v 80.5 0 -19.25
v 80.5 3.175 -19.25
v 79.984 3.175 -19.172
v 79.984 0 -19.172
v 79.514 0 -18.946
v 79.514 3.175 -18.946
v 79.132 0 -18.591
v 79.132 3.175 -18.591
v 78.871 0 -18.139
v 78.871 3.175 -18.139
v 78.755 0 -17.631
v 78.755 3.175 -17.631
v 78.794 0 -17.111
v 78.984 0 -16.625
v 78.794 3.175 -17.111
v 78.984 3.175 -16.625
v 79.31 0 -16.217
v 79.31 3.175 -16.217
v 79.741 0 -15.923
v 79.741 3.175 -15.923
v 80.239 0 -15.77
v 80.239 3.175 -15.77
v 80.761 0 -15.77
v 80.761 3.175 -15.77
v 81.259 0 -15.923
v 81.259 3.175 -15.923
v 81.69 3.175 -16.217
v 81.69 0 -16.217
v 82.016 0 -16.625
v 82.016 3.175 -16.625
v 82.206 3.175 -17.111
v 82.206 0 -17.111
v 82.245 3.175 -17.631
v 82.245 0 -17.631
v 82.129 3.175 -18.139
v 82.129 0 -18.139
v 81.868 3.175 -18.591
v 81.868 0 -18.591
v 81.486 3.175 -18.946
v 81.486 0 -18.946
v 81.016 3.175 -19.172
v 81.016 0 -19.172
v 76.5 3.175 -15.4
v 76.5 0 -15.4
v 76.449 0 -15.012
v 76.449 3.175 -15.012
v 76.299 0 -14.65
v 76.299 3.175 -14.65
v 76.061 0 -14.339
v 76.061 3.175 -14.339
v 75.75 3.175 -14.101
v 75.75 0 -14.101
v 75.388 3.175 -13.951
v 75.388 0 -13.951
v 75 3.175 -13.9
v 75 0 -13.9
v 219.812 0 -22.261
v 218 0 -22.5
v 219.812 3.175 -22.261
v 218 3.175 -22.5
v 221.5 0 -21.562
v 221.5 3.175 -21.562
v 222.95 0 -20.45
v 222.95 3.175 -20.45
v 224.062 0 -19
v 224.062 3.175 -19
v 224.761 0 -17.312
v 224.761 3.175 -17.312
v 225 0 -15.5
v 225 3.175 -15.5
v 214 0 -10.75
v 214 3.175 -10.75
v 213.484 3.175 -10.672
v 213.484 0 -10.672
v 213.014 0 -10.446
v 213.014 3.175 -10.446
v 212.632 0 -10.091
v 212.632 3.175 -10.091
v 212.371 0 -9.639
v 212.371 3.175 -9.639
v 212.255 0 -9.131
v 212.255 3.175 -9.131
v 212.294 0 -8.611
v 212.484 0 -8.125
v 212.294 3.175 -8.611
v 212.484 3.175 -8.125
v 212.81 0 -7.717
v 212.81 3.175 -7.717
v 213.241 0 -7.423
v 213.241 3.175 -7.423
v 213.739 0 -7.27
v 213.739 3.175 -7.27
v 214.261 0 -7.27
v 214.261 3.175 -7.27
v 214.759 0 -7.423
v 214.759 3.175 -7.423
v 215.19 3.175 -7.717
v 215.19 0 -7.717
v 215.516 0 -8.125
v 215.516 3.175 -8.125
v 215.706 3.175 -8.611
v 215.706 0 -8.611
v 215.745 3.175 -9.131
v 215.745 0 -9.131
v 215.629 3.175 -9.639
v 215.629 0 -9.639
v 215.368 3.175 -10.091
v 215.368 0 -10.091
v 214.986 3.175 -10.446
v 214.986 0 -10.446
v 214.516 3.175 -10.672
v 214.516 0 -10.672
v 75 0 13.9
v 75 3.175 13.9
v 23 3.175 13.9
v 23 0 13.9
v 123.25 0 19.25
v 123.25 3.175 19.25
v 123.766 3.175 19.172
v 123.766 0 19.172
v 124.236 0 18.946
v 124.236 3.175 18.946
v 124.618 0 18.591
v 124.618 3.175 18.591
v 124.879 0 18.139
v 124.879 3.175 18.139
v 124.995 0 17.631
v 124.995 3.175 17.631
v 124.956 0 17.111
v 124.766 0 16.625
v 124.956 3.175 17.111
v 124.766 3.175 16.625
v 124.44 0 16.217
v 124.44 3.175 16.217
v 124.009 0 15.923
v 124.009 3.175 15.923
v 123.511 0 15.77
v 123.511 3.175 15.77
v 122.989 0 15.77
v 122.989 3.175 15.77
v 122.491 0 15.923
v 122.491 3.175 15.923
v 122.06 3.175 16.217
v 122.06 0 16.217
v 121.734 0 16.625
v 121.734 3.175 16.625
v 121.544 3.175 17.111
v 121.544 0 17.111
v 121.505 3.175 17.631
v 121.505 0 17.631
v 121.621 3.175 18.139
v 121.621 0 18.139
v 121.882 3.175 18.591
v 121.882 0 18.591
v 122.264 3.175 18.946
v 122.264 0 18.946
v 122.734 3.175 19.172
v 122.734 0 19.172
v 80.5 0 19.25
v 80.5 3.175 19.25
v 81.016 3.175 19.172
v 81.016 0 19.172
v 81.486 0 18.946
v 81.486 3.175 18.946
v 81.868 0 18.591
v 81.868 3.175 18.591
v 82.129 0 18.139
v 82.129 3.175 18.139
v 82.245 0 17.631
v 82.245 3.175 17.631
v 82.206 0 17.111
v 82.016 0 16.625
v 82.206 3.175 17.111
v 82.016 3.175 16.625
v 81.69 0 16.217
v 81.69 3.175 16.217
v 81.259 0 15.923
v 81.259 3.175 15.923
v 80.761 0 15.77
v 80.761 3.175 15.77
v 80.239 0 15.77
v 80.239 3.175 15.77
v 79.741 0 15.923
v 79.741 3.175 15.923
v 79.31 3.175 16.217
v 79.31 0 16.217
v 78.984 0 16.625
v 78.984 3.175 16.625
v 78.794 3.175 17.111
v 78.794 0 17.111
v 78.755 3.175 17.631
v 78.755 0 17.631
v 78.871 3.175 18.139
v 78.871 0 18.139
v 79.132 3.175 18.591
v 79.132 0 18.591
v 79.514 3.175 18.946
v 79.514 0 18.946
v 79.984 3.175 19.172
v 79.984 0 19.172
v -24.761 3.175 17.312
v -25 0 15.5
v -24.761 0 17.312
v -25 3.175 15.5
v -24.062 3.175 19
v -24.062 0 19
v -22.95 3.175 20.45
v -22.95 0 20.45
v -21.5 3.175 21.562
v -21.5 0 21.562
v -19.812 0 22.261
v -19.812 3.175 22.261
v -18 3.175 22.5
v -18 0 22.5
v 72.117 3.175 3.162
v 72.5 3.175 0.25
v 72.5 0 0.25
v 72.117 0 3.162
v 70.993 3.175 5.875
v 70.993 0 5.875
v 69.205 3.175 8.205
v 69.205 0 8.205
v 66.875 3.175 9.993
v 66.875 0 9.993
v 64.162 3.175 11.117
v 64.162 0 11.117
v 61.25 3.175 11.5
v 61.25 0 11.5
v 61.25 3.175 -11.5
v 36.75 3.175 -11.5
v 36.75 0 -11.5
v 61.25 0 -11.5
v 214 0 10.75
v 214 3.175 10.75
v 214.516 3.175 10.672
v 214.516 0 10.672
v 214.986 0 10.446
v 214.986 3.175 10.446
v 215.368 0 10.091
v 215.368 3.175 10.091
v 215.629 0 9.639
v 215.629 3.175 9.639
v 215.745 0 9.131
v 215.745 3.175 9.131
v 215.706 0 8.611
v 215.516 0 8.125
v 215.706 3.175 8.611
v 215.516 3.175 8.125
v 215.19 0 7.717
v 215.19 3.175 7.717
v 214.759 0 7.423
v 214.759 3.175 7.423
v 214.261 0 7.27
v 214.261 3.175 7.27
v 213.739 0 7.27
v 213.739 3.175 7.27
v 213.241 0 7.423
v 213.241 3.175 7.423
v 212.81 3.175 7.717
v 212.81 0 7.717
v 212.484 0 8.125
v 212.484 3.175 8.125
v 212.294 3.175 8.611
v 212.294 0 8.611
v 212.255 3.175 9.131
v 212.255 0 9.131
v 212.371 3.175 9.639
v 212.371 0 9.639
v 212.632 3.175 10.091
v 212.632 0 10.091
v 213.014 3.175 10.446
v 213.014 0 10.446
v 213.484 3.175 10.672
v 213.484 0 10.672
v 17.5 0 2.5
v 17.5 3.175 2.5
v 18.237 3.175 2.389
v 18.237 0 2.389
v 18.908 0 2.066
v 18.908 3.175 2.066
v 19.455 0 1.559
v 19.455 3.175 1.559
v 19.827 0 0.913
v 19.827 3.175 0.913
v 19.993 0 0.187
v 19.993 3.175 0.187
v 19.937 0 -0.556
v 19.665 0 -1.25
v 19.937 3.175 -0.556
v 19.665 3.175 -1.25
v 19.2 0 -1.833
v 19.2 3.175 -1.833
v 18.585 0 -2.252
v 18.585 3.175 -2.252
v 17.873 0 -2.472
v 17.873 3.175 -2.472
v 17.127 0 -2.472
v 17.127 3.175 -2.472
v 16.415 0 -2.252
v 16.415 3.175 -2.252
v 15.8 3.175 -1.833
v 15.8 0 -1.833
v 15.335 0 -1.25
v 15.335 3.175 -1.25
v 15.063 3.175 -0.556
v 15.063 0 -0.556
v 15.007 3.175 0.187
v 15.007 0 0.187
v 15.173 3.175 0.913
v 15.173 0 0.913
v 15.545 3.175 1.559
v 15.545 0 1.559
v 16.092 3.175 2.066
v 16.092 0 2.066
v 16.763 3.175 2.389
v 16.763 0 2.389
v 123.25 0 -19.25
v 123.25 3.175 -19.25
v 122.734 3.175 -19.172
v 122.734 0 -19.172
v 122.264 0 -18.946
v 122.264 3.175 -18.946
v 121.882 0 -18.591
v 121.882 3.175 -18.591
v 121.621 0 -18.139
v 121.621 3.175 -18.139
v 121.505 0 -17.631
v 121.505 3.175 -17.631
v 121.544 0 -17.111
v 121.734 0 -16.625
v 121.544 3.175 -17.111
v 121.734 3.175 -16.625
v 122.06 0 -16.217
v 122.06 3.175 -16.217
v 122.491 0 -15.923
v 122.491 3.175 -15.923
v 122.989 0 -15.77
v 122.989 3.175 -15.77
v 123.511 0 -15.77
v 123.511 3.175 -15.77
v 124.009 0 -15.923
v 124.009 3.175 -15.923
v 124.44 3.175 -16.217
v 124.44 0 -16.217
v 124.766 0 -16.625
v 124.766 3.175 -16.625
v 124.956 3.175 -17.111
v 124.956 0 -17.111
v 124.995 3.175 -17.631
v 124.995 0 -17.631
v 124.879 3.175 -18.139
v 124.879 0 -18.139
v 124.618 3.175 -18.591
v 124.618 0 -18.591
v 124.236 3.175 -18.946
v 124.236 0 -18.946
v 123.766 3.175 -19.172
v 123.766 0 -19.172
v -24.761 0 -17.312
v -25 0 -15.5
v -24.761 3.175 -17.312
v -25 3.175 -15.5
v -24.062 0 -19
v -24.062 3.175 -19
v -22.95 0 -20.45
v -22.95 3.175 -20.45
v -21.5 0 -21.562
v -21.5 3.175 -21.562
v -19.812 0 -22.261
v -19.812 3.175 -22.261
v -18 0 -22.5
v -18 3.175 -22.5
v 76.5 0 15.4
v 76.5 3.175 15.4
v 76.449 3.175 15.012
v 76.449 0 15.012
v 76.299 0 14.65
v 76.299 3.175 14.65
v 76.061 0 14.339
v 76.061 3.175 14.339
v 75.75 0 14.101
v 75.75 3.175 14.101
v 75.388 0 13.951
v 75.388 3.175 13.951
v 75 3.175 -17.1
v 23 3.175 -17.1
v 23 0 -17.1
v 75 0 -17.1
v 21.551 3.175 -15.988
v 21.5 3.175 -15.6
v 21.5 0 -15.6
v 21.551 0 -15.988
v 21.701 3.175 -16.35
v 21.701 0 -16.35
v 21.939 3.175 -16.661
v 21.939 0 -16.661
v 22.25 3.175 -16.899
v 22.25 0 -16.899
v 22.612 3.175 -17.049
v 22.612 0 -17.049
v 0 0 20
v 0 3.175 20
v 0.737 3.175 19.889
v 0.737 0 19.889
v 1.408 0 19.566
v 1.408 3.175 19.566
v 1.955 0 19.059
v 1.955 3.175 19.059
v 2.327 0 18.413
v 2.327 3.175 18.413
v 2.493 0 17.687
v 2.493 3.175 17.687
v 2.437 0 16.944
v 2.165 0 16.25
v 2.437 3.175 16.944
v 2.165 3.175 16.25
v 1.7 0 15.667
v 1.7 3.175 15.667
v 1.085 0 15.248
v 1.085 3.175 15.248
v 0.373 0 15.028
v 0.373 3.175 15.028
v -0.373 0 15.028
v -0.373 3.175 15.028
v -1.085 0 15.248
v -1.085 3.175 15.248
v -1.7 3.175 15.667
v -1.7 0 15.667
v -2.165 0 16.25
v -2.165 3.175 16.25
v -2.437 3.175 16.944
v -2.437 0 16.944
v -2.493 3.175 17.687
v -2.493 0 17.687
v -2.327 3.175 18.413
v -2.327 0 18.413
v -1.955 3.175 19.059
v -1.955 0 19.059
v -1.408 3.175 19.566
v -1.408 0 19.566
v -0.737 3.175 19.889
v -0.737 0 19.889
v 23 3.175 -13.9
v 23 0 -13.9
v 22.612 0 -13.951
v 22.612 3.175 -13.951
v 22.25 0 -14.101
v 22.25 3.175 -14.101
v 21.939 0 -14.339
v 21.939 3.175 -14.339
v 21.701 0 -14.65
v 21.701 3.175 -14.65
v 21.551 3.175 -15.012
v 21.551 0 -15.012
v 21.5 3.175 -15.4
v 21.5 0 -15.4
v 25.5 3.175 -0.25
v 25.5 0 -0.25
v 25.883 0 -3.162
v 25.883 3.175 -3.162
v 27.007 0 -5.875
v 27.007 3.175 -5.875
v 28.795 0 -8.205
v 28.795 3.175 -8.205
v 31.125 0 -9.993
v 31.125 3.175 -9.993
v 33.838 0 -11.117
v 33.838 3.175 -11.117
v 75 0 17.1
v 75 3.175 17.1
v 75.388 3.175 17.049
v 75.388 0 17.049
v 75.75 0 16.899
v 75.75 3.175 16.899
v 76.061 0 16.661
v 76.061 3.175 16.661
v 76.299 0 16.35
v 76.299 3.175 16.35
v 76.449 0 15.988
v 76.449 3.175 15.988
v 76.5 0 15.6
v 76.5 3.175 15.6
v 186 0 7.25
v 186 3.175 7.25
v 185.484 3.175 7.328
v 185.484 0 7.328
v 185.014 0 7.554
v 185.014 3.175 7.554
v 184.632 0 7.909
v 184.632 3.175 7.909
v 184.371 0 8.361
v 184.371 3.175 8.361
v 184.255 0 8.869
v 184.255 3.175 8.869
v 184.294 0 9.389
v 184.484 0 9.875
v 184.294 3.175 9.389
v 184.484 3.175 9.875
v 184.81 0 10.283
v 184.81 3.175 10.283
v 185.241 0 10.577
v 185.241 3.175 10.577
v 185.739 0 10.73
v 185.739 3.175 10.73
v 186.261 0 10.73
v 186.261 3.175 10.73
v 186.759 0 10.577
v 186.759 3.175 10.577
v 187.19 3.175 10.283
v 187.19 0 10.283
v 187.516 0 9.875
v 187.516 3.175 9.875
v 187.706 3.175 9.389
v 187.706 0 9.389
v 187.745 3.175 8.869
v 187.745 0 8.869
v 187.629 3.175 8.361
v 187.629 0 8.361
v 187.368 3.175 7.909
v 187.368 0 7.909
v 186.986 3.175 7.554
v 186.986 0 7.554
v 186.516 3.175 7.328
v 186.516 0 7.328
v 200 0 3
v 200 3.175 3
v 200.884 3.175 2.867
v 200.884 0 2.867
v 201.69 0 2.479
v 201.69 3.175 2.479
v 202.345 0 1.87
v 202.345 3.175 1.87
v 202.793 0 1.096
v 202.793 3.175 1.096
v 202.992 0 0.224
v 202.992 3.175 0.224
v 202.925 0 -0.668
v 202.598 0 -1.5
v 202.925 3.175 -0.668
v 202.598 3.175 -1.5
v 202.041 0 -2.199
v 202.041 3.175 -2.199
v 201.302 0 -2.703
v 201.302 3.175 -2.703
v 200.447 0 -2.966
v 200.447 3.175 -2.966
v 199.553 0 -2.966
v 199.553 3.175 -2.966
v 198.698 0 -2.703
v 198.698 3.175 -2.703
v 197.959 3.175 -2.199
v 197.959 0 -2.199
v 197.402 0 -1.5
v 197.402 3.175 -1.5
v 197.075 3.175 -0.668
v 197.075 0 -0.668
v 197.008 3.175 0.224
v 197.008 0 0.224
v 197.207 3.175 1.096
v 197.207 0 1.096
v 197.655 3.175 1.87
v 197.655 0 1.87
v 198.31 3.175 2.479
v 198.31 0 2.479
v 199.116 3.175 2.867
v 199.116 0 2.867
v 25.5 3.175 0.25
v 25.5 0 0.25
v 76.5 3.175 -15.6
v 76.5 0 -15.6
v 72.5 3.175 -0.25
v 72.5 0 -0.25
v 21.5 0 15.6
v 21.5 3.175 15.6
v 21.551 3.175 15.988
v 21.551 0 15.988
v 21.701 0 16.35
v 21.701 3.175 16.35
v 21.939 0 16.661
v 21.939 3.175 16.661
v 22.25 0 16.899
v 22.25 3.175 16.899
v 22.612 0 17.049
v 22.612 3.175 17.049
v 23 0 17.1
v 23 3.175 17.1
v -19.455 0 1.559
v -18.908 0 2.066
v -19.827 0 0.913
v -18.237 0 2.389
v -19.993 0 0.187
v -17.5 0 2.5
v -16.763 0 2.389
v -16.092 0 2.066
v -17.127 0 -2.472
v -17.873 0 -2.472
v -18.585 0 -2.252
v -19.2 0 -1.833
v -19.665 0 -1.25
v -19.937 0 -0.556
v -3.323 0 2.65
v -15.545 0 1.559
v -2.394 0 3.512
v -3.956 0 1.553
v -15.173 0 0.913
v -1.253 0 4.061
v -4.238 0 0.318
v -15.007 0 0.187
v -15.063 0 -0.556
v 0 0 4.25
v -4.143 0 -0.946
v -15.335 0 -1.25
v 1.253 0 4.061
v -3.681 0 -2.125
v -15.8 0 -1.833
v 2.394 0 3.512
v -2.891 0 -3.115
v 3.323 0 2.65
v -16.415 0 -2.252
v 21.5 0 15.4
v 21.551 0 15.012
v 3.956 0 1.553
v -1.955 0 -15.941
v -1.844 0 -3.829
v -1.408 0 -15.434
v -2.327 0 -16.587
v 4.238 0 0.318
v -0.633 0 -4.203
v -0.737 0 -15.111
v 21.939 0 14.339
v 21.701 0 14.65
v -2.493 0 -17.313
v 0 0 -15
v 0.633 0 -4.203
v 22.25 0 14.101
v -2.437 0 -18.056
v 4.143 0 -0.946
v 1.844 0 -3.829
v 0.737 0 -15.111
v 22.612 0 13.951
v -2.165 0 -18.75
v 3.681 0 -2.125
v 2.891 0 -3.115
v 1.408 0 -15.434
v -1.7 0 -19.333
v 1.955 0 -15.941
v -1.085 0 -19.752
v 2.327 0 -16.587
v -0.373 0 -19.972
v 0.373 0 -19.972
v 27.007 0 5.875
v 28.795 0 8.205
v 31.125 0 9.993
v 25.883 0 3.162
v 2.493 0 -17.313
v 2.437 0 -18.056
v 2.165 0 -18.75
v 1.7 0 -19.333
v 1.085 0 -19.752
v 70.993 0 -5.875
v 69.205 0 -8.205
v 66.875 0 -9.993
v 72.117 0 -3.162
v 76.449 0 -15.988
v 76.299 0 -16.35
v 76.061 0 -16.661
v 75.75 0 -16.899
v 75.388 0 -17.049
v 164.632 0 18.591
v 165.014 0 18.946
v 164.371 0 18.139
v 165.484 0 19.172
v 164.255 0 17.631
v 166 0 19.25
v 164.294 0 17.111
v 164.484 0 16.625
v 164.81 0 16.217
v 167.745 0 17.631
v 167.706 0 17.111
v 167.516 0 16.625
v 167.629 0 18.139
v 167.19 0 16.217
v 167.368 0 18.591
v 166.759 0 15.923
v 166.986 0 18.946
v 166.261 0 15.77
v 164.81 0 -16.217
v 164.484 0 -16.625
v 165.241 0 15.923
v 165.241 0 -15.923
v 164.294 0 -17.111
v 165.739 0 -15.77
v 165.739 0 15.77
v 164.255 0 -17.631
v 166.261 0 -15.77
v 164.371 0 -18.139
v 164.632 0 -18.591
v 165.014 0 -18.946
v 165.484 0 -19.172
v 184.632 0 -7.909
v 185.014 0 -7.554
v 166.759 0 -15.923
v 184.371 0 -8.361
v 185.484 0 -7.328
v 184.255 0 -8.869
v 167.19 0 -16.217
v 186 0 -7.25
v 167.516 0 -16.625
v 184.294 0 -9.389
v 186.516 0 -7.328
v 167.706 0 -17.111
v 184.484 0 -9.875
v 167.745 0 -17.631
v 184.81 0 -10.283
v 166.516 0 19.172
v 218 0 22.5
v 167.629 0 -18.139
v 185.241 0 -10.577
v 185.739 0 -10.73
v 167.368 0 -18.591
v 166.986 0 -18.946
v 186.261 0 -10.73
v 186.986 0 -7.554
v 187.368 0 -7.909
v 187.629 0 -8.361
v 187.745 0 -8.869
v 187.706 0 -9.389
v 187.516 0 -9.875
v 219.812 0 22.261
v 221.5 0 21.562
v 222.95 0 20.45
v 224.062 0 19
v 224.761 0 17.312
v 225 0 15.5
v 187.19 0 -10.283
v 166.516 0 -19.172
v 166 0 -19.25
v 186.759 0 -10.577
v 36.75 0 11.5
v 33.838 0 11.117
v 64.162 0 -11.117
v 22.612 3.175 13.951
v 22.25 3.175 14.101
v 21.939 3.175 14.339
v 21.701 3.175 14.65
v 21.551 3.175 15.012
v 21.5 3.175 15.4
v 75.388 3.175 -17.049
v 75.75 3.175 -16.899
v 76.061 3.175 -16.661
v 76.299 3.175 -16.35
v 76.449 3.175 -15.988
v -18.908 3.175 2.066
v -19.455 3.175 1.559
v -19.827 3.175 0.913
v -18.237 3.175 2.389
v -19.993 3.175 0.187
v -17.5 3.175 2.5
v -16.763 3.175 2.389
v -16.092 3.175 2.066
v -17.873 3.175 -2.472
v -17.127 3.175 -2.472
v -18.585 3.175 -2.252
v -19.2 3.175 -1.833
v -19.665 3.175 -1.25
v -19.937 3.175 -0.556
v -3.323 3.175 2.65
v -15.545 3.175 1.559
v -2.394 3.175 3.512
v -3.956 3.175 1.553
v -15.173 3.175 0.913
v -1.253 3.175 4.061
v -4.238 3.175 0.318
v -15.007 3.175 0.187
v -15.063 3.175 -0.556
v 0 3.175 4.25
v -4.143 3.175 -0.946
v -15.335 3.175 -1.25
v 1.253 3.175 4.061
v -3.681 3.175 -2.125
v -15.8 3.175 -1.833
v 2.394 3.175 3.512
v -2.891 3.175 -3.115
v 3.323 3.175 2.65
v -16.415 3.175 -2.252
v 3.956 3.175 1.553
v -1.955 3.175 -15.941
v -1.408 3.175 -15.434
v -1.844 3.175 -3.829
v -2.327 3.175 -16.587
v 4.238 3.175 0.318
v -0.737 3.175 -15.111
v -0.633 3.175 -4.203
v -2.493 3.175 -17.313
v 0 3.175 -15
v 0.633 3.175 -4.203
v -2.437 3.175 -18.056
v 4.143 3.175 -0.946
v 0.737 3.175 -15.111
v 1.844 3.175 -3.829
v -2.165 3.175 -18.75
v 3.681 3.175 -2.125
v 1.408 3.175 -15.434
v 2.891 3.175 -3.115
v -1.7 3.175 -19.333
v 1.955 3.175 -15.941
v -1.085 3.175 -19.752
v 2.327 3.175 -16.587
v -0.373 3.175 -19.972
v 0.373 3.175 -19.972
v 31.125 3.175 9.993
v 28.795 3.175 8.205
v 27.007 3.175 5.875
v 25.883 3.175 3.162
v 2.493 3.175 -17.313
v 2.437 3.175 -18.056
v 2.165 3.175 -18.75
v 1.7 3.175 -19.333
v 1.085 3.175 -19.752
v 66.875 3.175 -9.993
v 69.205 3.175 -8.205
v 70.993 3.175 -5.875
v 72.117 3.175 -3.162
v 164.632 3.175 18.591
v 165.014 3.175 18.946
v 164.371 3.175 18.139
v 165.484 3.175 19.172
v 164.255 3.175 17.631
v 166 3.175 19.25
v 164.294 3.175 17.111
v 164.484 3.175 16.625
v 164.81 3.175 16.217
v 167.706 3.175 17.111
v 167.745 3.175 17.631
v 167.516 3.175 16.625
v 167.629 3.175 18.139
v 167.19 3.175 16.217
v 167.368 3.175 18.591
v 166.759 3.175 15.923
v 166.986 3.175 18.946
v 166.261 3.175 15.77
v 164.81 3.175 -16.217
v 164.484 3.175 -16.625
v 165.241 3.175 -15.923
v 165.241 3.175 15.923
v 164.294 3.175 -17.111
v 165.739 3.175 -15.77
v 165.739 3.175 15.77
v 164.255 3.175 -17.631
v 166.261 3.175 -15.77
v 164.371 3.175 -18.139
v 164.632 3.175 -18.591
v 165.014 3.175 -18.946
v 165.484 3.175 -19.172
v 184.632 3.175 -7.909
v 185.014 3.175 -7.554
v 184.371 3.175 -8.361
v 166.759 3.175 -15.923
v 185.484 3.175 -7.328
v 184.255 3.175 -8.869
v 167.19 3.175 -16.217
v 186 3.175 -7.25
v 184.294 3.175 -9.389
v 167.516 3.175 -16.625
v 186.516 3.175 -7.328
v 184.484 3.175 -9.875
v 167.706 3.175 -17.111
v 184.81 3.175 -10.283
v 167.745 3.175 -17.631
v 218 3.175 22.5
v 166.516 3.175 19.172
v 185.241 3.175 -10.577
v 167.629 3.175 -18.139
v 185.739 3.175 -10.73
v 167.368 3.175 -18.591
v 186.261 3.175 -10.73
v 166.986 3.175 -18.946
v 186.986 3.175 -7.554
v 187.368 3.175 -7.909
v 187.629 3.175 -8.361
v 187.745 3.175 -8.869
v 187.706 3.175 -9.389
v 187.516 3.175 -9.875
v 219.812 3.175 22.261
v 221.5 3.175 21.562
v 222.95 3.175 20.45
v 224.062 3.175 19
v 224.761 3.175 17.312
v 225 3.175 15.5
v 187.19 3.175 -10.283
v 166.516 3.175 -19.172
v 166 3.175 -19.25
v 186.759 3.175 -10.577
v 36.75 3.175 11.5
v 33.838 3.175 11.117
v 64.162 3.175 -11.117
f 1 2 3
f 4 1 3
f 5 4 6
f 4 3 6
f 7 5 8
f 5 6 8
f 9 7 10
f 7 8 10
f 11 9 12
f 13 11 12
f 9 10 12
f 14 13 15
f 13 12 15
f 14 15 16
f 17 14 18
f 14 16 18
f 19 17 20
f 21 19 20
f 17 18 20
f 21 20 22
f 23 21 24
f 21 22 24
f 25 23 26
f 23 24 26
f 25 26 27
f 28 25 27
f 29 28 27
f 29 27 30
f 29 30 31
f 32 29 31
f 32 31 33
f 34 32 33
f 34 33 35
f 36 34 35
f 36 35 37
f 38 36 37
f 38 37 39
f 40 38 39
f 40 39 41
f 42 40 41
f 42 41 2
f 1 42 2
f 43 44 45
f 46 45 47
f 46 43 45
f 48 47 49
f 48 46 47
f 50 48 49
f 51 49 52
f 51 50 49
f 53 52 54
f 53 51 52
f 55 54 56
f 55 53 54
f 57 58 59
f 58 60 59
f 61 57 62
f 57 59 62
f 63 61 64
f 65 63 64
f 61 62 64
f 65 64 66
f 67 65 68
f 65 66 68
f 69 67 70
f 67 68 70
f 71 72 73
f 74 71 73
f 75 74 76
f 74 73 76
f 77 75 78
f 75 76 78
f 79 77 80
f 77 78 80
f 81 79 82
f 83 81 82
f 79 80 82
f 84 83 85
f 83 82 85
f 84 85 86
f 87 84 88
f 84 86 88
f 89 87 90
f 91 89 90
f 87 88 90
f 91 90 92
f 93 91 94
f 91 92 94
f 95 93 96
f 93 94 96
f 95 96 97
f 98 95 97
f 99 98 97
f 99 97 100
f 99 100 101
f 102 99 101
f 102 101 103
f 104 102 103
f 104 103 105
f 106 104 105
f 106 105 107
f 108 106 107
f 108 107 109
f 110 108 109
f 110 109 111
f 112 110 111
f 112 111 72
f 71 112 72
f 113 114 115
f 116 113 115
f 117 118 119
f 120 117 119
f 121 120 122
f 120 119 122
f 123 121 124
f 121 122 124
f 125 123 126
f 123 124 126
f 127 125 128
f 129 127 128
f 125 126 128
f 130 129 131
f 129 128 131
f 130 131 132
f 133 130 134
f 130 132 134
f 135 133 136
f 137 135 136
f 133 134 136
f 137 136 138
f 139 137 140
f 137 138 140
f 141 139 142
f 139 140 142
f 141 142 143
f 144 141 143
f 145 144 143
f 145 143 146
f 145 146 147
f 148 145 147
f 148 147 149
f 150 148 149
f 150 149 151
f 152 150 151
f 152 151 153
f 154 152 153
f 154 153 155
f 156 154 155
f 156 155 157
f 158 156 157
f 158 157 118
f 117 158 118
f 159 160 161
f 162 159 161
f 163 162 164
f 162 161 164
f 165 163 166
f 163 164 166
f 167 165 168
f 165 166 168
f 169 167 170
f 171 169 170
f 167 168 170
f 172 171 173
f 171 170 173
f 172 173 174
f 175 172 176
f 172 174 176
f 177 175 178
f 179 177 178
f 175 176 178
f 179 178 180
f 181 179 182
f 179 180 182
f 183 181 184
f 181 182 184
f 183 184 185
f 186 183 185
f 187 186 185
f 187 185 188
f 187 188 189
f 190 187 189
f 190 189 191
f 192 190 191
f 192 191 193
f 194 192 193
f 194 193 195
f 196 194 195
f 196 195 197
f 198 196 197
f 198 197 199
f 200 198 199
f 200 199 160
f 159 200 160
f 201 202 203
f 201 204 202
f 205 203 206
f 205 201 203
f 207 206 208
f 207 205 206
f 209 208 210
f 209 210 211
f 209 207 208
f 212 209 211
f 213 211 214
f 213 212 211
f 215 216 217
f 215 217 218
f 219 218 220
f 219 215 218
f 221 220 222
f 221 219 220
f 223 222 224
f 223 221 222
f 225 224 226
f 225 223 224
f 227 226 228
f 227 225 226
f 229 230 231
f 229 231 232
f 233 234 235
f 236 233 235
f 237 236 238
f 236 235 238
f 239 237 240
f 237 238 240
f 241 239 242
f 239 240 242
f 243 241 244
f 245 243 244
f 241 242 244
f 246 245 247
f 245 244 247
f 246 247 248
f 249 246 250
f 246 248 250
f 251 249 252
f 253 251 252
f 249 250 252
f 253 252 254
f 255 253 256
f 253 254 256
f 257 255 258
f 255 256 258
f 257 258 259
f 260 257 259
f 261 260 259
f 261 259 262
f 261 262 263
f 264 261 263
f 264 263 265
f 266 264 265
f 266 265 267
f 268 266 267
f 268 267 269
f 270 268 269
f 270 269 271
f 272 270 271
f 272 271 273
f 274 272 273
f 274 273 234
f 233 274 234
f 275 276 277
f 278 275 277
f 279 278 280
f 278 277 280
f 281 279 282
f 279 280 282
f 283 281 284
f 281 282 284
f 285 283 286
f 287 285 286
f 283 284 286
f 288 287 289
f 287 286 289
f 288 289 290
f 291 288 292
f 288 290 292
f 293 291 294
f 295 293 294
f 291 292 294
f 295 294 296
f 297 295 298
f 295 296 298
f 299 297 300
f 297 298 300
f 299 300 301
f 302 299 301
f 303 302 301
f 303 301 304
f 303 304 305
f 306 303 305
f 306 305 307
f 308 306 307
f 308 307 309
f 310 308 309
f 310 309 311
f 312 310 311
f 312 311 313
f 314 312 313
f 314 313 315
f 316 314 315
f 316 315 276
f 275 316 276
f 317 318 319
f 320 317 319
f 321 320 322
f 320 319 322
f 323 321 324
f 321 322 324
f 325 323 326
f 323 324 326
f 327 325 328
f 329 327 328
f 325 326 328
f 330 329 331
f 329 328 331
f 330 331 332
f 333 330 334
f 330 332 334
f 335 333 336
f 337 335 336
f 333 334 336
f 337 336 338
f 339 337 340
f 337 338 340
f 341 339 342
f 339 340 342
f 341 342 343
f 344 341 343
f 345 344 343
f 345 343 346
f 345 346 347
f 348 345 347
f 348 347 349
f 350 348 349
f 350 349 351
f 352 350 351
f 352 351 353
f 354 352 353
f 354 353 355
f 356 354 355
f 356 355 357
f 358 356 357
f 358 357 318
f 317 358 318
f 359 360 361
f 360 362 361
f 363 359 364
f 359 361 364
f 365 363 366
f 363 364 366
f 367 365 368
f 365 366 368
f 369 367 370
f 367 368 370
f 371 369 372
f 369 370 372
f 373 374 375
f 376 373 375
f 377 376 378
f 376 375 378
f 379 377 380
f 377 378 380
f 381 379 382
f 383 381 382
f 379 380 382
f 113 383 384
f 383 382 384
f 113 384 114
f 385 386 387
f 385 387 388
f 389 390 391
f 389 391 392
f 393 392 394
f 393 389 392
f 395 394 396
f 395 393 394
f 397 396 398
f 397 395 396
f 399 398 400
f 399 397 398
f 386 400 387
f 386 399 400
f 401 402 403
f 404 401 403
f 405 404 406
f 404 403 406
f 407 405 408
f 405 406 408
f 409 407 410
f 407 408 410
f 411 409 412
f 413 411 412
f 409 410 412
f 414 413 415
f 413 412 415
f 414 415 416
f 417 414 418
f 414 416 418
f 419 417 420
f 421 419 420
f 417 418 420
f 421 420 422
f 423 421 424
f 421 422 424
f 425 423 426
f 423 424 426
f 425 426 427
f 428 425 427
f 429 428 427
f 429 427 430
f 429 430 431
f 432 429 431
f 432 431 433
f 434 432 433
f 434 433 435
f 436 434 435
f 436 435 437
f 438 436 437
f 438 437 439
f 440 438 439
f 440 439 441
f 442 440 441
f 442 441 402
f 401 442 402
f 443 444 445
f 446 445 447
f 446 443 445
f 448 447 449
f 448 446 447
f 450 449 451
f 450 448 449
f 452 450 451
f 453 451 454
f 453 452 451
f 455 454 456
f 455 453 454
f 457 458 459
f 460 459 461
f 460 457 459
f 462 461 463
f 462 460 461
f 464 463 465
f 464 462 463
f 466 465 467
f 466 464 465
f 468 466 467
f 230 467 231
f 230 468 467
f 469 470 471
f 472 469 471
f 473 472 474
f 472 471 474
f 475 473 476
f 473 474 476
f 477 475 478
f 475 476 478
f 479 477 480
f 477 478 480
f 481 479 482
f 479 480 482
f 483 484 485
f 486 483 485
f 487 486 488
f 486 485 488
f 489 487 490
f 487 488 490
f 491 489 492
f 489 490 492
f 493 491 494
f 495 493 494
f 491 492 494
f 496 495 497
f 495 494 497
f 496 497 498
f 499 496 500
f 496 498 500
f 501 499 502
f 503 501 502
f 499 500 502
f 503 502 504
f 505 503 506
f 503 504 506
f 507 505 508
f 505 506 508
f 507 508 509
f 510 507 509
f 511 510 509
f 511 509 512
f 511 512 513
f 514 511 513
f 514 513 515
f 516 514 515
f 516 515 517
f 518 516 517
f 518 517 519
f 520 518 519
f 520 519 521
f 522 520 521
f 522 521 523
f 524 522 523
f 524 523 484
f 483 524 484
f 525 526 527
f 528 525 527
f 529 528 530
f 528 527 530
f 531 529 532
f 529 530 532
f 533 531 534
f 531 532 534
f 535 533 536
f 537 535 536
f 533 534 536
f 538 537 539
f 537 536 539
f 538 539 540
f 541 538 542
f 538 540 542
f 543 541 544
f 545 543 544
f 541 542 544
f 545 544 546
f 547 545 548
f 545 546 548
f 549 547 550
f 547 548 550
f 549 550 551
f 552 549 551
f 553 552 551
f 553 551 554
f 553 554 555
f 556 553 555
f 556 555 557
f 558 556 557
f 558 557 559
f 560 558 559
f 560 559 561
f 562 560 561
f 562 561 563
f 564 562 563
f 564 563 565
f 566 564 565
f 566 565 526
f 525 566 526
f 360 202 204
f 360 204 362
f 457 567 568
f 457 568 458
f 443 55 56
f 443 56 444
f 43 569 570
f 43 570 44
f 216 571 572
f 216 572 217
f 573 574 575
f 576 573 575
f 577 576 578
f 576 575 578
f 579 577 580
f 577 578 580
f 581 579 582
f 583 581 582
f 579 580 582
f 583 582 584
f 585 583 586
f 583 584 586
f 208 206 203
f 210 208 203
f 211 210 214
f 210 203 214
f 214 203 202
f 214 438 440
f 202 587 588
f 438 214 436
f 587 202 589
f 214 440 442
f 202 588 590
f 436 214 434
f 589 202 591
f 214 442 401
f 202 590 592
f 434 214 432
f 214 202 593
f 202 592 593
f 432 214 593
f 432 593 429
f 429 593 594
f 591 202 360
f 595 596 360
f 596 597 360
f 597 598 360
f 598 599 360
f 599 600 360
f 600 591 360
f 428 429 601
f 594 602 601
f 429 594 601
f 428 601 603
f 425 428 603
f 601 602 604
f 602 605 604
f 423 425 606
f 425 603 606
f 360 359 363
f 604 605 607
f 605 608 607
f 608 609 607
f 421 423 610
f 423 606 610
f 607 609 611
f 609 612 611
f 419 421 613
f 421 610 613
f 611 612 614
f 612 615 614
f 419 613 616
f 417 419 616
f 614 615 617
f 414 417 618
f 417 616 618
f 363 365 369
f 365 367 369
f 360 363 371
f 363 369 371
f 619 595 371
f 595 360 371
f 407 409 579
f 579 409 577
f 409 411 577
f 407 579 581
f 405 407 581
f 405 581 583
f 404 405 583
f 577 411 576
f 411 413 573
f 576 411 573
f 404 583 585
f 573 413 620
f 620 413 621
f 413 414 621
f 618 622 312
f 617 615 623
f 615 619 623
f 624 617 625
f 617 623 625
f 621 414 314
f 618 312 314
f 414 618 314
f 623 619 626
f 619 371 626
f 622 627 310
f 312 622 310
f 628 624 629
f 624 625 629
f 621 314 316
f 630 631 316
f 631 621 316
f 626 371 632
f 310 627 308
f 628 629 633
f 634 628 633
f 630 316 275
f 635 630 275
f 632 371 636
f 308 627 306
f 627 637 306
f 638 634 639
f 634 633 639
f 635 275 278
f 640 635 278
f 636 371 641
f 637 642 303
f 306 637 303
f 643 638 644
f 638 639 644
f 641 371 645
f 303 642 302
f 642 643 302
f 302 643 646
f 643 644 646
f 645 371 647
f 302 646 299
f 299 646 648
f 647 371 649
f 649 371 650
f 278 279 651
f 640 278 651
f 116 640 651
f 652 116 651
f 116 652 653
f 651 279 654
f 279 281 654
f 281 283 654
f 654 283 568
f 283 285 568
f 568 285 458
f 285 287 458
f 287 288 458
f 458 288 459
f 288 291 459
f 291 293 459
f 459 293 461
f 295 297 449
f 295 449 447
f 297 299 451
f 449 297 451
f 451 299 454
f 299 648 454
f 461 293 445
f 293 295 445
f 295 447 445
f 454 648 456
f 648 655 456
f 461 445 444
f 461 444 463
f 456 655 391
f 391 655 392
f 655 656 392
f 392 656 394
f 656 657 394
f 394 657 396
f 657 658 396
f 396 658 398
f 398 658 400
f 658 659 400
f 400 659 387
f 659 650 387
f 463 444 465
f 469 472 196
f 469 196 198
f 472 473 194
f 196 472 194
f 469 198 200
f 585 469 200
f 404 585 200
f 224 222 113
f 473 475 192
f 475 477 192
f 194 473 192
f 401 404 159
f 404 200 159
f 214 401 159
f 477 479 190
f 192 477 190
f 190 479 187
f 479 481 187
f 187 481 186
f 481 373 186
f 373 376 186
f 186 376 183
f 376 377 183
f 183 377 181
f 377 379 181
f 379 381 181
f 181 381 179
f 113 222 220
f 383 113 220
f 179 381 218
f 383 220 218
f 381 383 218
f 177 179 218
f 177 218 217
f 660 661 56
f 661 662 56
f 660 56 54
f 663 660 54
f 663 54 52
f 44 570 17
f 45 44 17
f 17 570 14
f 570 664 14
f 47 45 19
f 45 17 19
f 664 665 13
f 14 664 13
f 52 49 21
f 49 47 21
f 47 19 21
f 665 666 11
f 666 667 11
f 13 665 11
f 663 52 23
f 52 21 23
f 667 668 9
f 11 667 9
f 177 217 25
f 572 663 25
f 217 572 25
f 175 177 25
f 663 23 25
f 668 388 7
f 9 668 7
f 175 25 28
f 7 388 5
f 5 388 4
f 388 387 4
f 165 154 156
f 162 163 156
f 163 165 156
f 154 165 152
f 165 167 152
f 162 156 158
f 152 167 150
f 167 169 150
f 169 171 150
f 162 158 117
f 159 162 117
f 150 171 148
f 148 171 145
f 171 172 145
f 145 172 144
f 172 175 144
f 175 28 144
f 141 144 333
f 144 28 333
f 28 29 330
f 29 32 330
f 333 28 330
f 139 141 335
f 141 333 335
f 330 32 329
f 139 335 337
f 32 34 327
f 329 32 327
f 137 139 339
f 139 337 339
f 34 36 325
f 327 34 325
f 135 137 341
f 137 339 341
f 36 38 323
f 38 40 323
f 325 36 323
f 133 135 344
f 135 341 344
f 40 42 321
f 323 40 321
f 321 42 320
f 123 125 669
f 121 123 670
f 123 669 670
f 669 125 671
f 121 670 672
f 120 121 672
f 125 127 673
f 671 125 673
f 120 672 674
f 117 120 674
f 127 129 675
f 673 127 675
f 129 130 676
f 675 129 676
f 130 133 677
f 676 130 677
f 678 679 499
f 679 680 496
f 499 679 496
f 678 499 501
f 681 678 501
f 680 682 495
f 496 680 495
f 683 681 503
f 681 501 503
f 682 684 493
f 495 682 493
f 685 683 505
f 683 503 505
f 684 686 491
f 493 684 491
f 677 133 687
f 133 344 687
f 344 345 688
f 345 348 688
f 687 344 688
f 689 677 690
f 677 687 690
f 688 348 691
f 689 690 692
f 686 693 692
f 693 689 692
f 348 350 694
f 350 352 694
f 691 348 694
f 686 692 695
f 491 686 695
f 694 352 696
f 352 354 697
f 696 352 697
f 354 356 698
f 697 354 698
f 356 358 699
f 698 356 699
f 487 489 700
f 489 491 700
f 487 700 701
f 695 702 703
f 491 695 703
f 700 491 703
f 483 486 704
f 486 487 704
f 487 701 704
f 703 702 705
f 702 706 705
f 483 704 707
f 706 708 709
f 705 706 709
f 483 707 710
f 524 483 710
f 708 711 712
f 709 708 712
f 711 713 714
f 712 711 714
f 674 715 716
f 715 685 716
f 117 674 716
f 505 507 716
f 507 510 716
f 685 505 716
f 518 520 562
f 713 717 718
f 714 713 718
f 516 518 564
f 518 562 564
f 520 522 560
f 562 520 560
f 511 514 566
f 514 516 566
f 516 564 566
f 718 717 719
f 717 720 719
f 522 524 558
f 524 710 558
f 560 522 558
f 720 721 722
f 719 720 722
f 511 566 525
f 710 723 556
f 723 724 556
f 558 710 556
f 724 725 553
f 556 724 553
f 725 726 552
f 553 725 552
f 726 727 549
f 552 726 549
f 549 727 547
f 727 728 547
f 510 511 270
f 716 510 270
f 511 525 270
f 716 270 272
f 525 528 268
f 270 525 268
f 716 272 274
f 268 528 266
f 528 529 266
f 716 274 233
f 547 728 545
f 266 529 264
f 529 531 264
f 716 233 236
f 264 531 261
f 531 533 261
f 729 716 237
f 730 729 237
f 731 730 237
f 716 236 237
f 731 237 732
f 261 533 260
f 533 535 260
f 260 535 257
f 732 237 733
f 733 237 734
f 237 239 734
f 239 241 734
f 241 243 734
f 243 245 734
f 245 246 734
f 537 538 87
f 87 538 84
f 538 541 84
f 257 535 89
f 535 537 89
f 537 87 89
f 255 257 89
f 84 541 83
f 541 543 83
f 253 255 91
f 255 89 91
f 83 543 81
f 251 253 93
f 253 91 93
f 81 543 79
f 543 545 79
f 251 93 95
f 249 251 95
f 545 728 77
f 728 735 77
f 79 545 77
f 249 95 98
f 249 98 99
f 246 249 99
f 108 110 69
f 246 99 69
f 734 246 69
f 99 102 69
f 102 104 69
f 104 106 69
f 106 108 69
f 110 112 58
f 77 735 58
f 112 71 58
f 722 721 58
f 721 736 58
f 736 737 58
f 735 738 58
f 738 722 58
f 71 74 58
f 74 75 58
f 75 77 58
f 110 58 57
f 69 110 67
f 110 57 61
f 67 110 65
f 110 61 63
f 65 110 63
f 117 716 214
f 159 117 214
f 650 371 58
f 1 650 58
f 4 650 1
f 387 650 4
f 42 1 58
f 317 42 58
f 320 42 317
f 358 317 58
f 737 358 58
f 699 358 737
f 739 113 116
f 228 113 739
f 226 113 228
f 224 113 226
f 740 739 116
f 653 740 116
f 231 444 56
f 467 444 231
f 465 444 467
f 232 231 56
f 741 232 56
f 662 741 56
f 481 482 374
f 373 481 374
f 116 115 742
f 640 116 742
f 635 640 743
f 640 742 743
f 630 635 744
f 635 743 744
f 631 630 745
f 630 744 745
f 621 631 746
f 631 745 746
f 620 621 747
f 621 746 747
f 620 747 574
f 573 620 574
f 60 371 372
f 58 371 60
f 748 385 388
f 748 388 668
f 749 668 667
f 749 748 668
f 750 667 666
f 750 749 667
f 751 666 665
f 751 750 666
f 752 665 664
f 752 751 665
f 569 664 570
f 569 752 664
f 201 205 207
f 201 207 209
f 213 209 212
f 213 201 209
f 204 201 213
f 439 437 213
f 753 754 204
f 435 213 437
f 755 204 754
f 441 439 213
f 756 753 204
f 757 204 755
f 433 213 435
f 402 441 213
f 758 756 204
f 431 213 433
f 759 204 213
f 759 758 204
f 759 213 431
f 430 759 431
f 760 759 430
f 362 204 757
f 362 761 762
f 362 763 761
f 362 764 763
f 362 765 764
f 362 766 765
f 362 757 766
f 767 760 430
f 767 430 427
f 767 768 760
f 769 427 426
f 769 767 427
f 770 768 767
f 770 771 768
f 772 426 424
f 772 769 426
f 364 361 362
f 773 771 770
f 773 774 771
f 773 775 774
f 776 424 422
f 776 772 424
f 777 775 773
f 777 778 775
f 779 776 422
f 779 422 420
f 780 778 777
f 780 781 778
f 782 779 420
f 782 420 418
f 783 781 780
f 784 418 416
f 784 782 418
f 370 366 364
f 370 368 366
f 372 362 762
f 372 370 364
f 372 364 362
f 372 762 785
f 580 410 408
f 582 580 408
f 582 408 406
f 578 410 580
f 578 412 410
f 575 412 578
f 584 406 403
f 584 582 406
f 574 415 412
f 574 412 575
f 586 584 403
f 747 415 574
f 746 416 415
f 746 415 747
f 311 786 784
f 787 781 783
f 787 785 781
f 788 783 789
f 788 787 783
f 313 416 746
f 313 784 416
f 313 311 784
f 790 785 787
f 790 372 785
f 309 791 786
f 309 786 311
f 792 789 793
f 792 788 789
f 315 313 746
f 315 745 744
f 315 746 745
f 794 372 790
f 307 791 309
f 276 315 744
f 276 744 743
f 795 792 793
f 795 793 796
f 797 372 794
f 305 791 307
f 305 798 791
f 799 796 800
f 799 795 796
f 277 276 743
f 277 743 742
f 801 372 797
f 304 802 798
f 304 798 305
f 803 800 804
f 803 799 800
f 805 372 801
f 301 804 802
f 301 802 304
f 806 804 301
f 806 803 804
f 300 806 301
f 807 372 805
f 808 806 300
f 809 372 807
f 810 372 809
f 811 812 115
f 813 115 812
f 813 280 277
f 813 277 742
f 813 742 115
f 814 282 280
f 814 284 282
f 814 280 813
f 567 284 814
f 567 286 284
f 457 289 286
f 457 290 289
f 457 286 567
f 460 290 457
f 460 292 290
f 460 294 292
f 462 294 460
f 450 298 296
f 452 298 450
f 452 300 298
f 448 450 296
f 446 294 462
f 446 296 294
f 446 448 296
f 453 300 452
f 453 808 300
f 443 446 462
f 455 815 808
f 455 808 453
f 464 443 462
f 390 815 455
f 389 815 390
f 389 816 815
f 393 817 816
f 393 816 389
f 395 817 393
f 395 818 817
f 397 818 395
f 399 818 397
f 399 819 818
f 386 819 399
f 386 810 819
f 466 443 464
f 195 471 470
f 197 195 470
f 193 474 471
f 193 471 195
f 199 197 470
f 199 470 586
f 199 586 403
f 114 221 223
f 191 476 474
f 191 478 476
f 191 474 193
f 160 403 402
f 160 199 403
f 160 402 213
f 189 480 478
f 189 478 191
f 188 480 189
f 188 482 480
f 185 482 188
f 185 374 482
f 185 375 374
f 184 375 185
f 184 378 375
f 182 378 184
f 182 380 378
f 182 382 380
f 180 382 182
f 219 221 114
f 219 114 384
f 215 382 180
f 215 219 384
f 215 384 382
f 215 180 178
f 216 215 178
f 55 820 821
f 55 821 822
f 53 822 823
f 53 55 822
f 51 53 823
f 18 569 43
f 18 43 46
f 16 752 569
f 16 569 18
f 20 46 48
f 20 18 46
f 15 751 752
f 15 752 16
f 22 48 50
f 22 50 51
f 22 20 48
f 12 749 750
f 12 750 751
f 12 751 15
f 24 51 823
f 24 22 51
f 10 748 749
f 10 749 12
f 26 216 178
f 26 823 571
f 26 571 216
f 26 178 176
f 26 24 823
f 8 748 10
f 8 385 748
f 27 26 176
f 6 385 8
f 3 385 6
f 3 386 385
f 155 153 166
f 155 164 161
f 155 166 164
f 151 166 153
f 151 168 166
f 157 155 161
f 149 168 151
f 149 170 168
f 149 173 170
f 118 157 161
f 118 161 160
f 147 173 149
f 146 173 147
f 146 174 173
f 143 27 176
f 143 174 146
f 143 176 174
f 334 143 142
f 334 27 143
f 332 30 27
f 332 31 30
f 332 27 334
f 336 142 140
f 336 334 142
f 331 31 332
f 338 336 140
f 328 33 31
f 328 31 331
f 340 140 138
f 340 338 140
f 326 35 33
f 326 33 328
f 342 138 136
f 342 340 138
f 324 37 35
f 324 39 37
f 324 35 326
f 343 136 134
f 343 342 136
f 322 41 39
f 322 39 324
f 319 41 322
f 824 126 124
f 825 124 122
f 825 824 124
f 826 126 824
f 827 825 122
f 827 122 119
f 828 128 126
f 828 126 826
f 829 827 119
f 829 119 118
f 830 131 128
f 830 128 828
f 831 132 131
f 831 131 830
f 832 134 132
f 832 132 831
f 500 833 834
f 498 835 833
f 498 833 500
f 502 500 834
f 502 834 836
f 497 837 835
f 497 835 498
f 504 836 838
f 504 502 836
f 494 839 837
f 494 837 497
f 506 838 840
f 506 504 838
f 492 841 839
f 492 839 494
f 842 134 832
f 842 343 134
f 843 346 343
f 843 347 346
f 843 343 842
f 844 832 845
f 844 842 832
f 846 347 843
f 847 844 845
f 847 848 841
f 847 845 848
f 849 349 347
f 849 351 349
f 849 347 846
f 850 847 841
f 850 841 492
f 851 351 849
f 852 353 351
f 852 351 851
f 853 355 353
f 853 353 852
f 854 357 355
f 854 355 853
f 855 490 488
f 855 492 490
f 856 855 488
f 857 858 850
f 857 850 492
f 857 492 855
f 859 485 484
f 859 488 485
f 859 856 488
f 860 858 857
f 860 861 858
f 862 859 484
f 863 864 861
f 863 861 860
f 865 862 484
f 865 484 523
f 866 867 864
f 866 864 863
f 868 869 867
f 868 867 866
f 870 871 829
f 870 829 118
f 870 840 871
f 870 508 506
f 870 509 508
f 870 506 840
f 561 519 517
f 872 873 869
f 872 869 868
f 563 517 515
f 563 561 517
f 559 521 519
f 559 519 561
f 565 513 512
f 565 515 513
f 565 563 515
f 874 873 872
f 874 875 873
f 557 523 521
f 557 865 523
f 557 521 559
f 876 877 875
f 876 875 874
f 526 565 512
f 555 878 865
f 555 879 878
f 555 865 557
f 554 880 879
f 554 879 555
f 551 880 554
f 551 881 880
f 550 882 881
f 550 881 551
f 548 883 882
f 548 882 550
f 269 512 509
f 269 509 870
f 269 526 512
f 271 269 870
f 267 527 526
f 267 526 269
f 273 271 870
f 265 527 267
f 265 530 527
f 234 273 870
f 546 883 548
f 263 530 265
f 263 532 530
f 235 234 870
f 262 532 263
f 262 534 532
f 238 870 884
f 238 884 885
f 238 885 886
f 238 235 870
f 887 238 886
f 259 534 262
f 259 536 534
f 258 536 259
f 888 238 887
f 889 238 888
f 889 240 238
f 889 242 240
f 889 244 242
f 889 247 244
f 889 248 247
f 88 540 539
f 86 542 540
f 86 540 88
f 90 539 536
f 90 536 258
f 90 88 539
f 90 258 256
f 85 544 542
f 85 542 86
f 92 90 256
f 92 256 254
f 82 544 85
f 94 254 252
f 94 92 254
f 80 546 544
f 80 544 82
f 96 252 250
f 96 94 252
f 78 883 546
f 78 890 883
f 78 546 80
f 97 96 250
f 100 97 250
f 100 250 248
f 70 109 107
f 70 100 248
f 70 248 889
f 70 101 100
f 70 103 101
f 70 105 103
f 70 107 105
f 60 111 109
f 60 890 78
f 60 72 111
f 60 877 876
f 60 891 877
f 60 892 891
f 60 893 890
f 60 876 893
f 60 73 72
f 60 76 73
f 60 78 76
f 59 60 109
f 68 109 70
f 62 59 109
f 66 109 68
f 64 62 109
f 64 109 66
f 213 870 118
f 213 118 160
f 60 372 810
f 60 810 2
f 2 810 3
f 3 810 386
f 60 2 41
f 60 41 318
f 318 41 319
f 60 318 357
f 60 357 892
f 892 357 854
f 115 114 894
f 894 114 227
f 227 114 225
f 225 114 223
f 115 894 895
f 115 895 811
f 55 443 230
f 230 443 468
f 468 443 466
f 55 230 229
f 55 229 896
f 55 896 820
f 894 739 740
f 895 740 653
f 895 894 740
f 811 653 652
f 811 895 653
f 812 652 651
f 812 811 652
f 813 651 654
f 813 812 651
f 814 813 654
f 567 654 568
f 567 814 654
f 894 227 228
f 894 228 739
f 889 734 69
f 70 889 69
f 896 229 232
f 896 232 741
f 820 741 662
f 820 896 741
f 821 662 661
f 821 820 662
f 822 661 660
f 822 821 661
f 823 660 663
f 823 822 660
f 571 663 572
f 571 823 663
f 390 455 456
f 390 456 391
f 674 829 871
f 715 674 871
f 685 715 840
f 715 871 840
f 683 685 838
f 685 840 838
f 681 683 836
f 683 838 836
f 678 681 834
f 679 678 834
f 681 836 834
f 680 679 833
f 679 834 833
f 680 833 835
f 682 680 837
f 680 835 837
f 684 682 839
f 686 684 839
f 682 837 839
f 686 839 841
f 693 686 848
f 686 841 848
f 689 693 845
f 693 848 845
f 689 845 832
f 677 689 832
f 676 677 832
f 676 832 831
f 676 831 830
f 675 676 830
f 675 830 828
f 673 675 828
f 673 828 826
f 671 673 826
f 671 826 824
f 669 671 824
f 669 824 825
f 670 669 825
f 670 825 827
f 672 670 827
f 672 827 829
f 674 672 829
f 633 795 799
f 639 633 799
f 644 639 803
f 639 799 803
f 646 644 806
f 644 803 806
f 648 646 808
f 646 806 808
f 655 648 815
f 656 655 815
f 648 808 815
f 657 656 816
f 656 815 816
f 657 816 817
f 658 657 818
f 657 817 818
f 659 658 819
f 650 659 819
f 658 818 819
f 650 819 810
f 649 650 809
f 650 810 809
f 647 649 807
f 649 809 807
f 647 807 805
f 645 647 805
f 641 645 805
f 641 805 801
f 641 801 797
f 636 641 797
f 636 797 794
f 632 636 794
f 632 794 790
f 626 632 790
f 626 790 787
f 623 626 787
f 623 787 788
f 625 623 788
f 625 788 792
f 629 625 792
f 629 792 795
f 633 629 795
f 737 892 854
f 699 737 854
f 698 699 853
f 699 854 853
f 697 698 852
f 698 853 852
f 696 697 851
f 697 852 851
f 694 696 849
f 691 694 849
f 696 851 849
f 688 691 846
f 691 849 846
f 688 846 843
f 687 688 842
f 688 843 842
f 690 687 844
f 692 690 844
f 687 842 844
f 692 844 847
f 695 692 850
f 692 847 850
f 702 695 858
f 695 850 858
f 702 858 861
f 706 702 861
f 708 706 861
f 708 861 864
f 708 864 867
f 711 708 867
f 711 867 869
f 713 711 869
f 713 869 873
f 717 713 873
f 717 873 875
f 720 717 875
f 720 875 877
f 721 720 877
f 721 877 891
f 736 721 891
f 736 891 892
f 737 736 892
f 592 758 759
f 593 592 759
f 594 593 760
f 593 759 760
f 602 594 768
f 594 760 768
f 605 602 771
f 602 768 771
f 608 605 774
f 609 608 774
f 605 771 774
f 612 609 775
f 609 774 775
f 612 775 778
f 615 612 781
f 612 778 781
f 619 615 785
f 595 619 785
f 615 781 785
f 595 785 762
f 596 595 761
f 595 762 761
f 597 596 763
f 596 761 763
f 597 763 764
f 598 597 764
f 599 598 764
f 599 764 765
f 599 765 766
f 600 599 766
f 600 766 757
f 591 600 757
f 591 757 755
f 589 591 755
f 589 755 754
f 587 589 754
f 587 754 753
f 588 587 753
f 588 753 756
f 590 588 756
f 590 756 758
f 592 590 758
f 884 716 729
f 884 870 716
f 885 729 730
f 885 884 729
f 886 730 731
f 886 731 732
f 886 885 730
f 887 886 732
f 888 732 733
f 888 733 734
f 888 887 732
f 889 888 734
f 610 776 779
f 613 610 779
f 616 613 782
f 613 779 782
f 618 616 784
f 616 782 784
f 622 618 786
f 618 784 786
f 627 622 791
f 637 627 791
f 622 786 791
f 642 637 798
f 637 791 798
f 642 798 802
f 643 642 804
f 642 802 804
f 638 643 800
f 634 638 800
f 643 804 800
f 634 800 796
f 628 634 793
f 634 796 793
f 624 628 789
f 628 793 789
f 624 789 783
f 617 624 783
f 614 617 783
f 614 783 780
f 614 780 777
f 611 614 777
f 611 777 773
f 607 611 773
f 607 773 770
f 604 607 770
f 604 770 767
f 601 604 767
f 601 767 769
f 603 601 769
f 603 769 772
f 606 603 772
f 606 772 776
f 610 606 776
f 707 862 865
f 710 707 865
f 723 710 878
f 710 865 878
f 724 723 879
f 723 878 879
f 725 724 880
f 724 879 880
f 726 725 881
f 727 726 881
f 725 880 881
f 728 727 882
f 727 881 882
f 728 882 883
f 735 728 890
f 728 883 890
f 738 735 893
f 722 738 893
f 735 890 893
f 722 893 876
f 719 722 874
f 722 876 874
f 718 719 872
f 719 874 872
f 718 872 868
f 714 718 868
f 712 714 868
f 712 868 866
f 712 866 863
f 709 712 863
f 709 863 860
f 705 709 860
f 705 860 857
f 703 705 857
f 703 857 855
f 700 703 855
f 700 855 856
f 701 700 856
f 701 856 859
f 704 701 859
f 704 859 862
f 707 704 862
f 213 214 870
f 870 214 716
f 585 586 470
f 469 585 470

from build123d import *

# Parameters (mm, degrees)
SKETCH1_W           = 250
SKETCH1_H           = 45
BOSS_EXTRUDE1_DEPTH = 3.175
SKETCH4_R           = 3
SKETCH4_R_2         = 1.75
CUT_EXTRUDE1_DEPTH  = 227.144490592
SKETCH5_R           = 4.25
CUT_EXTRUDE2_DEPTH  = 227.144490592
SKETCH6_R           = 11.5
SKETCH6_R_2         = 1.5
CUT_EXTRUDE3_DEPTH  = 227.144490592
SKETCH10_R          = 1.75
CUT_EXTRUDE4_DEPTH  = 227.144490592
FILLET1_R           = 7
SKETCH11_R          = 2.5
CUT_EXTRUDE5_DEPTH  = 227.144490592
CUT_EXTRUDE6_DEPTH  = 227.144490592


with BuildPart() as part:
    # Sketch1 → Boss-Extrude1 (new body)
    with BuildSketch(Plane(origin=(0, 0, 0), x_dir=(1, 0, 0), z_dir=(0, 1, 0))):
        with Locations((100, 0)):
            Rectangle(SKETCH1_W, SKETCH1_H)
    extrude(amount=BOSS_EXTRUDE1_DEPTH)

    # Sketch4 → Cut-Extrude1 (cut, through all)
    with BuildSketch(Plane(origin=(0, 3.175, 0), x_dir=(1, 0, 0), z_dir=(0, 1, 0))):
        with Locations(Location((200, 0, 0), (0, 0, 270))):
            Circle(SKETCH4_R)
        with Locations(Location((186, 9, 0), (0, 0, 270))):
            Circle(SKETCH4_R_2)
        with Locations(Location((214, 9, 0), (0, 0, 90))):
            Circle(SKETCH4_R_2)
        with Locations(Location((214, -9, 0), (0, 0, 270))):
            Circle(SKETCH4_R_2)
        with Locations(Location((186, -9, 0), (0, 0, 90))):
            Circle(SKETCH4_R_2)
    extrude(amount=-CUT_EXTRUDE1_DEPTH, mode=Mode.SUBTRACT)

    # Sketch5 → Cut-Extrude2 (cut, through all)
    with BuildSketch(Plane(origin=(0, 3.175, 0), x_dir=(1, 0, 0), z_dir=(0, 1, 0))):
        with Locations(Location((0, 0, 0), (0, 0, 270))):
            Circle(SKETCH5_R)
    extrude(amount=-CUT_EXTRUDE2_DEPTH, mode=Mode.SUBTRACT)

    # Sketch6 → Cut-Extrude3 (cut, through all)
    with BuildSketch(Plane(origin=(0, 3.175, 0), x_dir=(1, 0, 0), z_dir=(0, 1, 0))):
        with Locations(Location((45, 0, 0), (0, 0, 270))):
            Circle(SKETCH6_R)
        with Locations(Location((29.5, 15.5, 0), (0, 0, 270))):
            Circle(SKETCH6_R_2)
        with Locations(Location((60.5, 15.5, 0), (0, 0, 90))):
            Circle(SKETCH6_R_2)
        with Locations(Location((60.5, -15.5, 0), (0, 0, 270))):
            Circle(SKETCH6_R_2)
        with Locations(Location((29.5, -15.5, 0), (0, 0, 90))):
            Circle(SKETCH6_R_2)
    extrude(amount=-CUT_EXTRUDE3_DEPTH, mode=Mode.SUBTRACT)

    # Sketch10 → Cut-Extrude4 (cut, through all)
    with BuildSketch(Plane(origin=(0, 3.175, 0), x_dir=(1, 0, 0), z_dir=(0, 1, 0))):
        with Locations(Location((80.5, -17.5, 0), (0, 0, 270))):
            Circle(SKETCH10_R)
        with Locations(Location((123.25, -17.5, 0), (0, 0, 270))):
            Circle(SKETCH10_R)
        with Locations(Location((166, -17.5, 0), (0, 0, 270))):
            Circle(SKETCH10_R)
        with Locations(Location((166, 17.5, 0), (0, 0, 90))):
            Circle(SKETCH10_R)
        with Locations(Location((80.5, 17.5, 0), (0, 0, 90))):
            Circle(SKETCH10_R)
        with Locations(Location((123.25, 17.5, 0), (0, 0, 90))):
            Circle(SKETCH10_R)
    extrude(amount=-CUT_EXTRUDE4_DEPTH, mode=Mode.SUBTRACT)

    # Fillet1
    fillet1_edges = [part.edges().sort_by_distance(p)[0] for p in [
        (-25, 1.5875, -22.5),
        (225, 1.5875, -22.5),
        (225, 1.5875, 22.5),
        (-25, 1.5875, 22.5),
    ]]
    fillet(fillet1_edges, radius=FILLET1_R)

    # Sketch11 → Cut-Extrude5 (cut, through all)
    with BuildSketch(Plane(origin=(0, 3.175, 0), x_dir=(1, 0, 0), z_dir=(0, 1, 0))):
        with Locations(Location((0, 17.5, 0), (0, 0, 270))):
            Circle(SKETCH11_R)
        with Locations(Location((17.5, 0, 0), (0, 0, 270))):
            Circle(SKETCH11_R)
        with Locations(Location((0, -17.5, 0), (0, 0, 270))):
            Circle(SKETCH11_R)
        with Locations(Location((-17.5, 0, 0), (0, 0, 270))):
            Circle(SKETCH11_R)
    extrude(amount=-CUT_EXTRUDE5_DEPTH, mode=Mode.SUBTRACT)

    # Sketch12 → Cut-Extrude6 (cut, through all)
    with BuildSketch(Plane(origin=(0, 3.175, 0), x_dir=(1, 0, 0), z_dir=(0, 1, 0))):
        with BuildLine():
            Line((23, 17.1), (75, 17.1))
            ThreePointArc((75, 17.1), (76.060660172, 16.660660172), (76.5, 15.6))
            Line((76.5, 15.6), (76.5, 15.4))
            ThreePointArc((76.5, 15.4), (76.060660172, 14.339339828), (75, 13.9))
            Line((75, 13.9), (23, 13.9))
            ThreePointArc((23, 13.9), (21.939339828, 14.339339828), (21.5, 15.4))
            Line((21.5, 15.4), (21.5, 15.6))
            ThreePointArc((21.5, 15.6), (21.939339828, 16.660660172), (23, 17.1))
        make_face()
        with BuildLine():
            Line((76.5, -15.6), (76.5, -15.4))
            ThreePointArc((76.5, -15.4), (76.060660172, -14.339339828), (75, -13.9))
            Line((75, -13.9), (23, -13.9))
            ThreePointArc((23, -13.9), (21.939339828, -14.339339828), (21.5, -15.4))
            Line((21.5, -15.4), (21.5, -15.6))
            ThreePointArc((21.5, -15.6), (21.939339828, -16.660660172), (23, -17.1))
            Line((23, -17.1), (75, -17.1))
            ThreePointArc((75, -17.1), (76.060660172, -16.660660172), (76.5, -15.6))
        make_face()
        with BuildLine():
            Line((36.75, 11.5), (61.25, 11.5))
            ThreePointArc((61.25, 11.5), (69.204951288, 8.204951288), (72.5, 0.25))
            Line((72.5, 0.25), (72.5, -0.25))
            ThreePointArc((72.5, -0.25), (69.204951288, -8.204951288), (61.25, -11.5))
            Line((61.25, -11.5), (36.75, -11.5))
            ThreePointArc((36.75, -11.5), (28.795048712, -8.204951288), (25.5, -0.25))
            Line((25.5, -0.25), (25.5, 0.25))
            ThreePointArc((25.5, 0.25), (28.795048712, 8.204951288), (36.75, 11.5))
        make_face()
    extrude(amount=-CUT_EXTRUDE6_DEPTH, mode=Mode.SUBTRACT)


solid = part.part
